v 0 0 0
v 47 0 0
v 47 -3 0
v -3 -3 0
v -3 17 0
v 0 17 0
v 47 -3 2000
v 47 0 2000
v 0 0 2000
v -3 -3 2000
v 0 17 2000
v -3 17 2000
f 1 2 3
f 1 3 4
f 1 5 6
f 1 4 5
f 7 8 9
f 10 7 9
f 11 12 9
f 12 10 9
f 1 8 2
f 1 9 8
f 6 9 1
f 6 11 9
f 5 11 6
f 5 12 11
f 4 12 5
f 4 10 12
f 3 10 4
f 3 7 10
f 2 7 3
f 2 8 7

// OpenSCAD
/*

 a |_
    b
 material_thickness = c
*/

module simple_profile_L(a,b,c, length) {
    translate([-c,-c,0])
    linear_extrude( height = length ) {
        polygon(
            points = [
                [0,0],
                [b,0],
                [b,c],
                [c,c],
                [c,a],
                [0,a]
            ],
            paths = [
                [0,1,2,3,4,5],
            ]
        );
    }
}

simple_profile_L(20,50,3, 2000);
